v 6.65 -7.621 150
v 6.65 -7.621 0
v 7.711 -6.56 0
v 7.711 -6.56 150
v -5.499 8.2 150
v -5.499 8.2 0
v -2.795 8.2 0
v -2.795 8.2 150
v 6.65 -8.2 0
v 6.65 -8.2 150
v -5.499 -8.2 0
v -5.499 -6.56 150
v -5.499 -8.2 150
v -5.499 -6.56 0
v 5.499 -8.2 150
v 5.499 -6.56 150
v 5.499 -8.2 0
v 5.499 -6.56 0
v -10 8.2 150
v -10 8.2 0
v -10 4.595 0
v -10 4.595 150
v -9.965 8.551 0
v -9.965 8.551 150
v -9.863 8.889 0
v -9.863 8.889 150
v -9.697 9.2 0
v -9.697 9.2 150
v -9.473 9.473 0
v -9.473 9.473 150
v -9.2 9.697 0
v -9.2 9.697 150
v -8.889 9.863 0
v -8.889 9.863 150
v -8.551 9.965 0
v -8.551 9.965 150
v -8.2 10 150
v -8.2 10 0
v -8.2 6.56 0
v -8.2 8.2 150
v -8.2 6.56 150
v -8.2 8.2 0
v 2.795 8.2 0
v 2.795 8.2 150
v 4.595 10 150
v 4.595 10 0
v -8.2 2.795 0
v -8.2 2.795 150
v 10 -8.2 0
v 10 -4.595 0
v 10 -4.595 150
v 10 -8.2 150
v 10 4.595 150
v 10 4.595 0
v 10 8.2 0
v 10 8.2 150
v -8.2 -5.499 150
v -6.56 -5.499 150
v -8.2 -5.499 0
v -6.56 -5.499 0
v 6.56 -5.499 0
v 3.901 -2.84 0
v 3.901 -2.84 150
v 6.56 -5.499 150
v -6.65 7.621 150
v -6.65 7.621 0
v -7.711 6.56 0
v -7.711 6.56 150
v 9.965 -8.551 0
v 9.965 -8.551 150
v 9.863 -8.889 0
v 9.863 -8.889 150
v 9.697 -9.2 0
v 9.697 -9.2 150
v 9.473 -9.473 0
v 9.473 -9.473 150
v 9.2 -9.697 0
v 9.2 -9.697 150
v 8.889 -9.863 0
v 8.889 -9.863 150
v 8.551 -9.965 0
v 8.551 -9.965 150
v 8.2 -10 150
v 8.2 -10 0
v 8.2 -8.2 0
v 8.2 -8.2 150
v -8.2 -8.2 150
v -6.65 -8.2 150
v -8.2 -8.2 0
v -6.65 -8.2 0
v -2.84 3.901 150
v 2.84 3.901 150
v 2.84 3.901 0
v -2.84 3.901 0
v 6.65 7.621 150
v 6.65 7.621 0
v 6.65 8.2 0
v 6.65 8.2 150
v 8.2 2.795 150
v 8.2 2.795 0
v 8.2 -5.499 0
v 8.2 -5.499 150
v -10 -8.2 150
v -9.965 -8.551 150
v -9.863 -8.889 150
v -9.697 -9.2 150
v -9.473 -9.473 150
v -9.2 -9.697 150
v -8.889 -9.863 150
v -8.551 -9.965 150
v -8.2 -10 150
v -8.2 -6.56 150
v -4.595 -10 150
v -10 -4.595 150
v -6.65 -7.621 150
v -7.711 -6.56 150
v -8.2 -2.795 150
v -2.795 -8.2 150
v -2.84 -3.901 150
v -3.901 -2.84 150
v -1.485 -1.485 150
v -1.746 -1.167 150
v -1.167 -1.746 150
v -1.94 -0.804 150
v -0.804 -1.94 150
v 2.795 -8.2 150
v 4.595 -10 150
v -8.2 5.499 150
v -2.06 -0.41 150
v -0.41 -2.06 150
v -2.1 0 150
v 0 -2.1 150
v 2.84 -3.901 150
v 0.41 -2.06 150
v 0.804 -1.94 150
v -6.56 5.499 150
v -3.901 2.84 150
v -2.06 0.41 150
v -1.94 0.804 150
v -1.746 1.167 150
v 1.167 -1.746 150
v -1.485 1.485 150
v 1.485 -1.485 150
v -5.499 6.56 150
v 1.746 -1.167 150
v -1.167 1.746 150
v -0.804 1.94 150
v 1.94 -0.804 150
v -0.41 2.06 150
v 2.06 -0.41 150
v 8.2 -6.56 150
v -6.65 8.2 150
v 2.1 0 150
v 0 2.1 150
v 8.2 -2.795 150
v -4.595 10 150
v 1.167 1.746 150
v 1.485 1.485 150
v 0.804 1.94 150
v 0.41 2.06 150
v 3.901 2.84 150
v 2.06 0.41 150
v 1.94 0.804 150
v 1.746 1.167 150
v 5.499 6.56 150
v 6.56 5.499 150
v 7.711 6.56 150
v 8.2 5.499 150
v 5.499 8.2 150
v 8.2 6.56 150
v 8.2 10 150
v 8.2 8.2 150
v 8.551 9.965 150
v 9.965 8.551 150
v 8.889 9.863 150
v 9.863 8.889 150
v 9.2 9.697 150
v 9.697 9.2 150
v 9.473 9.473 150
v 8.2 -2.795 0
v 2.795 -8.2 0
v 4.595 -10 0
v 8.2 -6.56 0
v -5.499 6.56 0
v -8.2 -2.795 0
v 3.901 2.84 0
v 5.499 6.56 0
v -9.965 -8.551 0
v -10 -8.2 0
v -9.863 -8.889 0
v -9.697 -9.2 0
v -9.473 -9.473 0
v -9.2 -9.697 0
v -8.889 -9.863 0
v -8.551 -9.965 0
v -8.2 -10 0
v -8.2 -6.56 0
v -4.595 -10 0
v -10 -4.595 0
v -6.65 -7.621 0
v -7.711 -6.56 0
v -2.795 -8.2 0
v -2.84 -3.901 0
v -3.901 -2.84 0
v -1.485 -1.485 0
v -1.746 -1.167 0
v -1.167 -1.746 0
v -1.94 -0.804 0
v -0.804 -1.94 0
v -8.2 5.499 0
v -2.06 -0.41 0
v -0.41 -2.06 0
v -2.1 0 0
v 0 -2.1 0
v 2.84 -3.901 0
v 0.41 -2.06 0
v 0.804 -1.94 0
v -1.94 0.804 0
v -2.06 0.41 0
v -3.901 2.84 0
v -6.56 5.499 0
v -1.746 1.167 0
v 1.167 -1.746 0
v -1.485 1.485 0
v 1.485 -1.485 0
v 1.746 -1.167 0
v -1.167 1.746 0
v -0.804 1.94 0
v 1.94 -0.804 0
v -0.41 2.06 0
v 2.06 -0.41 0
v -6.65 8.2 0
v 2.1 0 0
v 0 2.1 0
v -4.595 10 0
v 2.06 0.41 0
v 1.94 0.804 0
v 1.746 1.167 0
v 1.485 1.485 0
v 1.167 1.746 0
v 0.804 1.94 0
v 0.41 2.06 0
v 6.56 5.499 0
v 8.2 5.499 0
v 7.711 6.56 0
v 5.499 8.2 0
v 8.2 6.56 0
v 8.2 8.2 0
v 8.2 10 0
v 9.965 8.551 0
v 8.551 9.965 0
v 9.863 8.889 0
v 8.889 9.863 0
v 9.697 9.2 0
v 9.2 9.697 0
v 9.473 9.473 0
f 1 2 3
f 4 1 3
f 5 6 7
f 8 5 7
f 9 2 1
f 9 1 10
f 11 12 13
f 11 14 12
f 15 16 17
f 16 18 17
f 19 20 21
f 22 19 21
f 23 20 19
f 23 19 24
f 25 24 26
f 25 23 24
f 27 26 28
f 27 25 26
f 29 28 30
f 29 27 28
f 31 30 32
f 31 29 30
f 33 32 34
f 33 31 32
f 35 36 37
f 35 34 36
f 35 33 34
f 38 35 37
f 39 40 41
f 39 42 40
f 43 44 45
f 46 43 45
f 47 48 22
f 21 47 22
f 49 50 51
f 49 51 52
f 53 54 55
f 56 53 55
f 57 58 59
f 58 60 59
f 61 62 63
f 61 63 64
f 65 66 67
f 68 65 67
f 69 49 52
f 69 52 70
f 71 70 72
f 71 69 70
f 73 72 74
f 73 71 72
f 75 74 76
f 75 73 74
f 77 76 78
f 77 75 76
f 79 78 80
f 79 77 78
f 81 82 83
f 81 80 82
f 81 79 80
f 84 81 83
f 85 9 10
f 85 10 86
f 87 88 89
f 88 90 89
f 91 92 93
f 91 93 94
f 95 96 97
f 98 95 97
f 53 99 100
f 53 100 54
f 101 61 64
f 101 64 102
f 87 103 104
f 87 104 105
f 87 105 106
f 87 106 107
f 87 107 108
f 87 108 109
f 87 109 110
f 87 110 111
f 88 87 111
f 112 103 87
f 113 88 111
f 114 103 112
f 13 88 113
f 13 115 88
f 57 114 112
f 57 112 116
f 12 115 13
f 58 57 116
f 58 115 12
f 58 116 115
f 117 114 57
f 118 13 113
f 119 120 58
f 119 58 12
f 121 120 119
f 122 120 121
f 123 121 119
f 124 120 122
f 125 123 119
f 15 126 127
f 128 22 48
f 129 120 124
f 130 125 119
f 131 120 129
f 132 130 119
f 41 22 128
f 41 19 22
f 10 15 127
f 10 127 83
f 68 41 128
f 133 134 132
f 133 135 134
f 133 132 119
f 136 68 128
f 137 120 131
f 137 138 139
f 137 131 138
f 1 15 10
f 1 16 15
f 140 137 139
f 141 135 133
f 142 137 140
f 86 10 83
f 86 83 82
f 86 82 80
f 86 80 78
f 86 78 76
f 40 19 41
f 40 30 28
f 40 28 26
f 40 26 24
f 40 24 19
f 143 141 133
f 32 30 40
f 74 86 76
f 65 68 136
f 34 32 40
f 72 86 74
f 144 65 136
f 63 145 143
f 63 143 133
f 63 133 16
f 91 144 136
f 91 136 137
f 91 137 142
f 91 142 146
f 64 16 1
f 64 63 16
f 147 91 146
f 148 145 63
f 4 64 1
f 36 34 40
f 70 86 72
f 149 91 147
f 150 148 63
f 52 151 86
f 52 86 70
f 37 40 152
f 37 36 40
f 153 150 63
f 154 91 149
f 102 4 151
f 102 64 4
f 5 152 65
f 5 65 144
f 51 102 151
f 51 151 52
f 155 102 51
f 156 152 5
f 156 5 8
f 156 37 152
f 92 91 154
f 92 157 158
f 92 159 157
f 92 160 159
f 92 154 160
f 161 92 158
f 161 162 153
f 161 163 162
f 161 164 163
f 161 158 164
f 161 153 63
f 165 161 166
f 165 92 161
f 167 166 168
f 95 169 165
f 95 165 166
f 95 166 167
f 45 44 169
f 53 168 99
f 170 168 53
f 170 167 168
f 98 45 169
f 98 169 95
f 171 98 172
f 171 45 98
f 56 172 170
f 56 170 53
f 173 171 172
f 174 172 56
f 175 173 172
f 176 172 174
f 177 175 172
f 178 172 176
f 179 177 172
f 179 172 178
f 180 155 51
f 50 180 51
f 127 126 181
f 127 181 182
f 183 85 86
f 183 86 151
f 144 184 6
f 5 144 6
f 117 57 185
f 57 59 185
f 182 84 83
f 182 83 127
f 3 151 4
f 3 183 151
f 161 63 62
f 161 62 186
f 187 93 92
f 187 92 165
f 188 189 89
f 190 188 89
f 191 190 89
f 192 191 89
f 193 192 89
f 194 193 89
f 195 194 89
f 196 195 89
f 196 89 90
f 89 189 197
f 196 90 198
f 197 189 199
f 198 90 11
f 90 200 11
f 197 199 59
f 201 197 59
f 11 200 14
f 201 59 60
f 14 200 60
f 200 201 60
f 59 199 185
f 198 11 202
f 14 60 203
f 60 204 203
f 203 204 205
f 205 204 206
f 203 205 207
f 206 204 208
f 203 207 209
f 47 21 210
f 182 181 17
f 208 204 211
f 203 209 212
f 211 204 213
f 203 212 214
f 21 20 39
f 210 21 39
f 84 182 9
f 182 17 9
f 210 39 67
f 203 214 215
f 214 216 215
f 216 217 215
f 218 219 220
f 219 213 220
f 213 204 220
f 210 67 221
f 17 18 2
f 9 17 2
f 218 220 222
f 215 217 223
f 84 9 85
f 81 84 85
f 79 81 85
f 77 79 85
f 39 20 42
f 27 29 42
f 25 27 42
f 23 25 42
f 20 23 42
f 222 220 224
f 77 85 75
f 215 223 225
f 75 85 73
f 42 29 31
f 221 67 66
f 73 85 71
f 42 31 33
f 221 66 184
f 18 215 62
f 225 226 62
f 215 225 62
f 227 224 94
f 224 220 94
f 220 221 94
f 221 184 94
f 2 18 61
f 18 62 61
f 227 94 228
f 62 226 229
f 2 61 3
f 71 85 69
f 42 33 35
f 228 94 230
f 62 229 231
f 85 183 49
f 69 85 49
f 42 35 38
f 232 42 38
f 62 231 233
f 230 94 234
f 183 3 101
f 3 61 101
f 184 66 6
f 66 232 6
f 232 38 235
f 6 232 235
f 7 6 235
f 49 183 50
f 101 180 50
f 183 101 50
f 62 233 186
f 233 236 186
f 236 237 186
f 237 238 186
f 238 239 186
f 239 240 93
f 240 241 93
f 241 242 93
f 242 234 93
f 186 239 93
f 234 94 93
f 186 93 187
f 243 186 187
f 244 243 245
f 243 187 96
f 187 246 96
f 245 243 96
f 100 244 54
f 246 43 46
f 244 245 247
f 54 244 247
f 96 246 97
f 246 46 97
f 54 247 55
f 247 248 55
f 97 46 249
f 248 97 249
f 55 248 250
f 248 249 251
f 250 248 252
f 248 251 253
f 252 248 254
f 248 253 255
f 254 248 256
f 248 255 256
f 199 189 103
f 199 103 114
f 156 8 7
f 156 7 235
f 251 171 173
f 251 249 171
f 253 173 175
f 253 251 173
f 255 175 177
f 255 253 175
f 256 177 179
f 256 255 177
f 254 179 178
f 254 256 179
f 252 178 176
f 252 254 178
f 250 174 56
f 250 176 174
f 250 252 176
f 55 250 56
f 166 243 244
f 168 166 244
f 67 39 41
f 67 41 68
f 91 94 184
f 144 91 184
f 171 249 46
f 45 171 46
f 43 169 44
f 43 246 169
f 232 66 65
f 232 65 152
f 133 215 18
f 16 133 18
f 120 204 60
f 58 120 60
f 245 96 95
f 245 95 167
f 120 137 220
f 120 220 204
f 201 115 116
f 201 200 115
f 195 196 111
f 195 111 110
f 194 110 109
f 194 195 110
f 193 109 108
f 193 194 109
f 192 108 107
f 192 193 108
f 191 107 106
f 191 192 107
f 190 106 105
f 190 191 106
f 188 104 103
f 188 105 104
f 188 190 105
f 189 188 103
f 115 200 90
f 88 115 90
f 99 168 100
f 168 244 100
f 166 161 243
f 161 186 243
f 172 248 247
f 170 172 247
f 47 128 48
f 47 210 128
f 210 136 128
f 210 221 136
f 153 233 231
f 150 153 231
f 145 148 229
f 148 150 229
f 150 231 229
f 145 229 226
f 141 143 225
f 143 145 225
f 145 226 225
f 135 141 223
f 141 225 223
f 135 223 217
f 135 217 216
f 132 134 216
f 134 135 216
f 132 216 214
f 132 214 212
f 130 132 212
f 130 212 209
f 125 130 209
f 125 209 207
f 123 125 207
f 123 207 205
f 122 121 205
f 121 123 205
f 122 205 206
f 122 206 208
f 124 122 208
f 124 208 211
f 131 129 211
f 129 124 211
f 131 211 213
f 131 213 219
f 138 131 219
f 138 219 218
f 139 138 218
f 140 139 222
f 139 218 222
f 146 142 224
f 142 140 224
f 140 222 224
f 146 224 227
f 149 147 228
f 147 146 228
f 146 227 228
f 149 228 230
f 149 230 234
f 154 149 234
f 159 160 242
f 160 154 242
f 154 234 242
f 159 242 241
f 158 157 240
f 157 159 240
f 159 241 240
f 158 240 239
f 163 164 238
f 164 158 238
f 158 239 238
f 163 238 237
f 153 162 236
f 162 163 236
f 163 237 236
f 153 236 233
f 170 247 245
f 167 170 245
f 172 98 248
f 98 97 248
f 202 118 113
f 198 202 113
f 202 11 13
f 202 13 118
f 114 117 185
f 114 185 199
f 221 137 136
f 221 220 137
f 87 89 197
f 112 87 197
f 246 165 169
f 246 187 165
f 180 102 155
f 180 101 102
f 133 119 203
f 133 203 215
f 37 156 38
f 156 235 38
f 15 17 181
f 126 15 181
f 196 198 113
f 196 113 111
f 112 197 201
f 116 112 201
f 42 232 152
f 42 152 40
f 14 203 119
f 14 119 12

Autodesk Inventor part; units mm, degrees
ref_plane "YZ Plane" through (0, 0, 0) normal (1, 0, 0) x (0, 1, 0)
sketch "Sketch1" plane through (0, 0, 0) normal (0, 0, 1) x (1, 0, 0)
  line L0 (10, -4.5951) -> (10, -8.2)
  line L1 (-10, -8.2) -> (-10, -4.5951)
  line L2 (-10, 10) -> (10, -10) construction
  line L3 (10, 10) -> (-10, -10) construction
  circle A0 centre (0, 0) radius 2.1
  line L4 (-2.84, -3.9007) -> (2.84, -3.9007)
  line L5 (3.9007, -2.84) -> (3.9007, 2.84)
  line L6 (2.84, 3.9007) -> (-2.84, 3.9007)
  line L7 (-3.9007, 2.84) -> (-3.9007, -2.84)
  line L8 (-3.9007, -3.9007) -> (3.9007, 3.9007) construction
  line L9 (3.9007, -3.9007) -> (-3.9007, 3.9007) construction
  line L10 (-3.9007, -2.84) -> (-2.84, -3.9007) construction
  line L11 (-2.84, -3.9007) -> (-5.4993, -6.56)
  line L12 (-5.4993, -6.56) -> (-5.4993, -8.2)
  line L13 (-5.4993, -8.2) -> (-2.7951, -8.2)
  line L14 (-2.7951, -8.2) -> (-4.5951, -10)
  line L15 (0, 0) -> (0, -3.9007) construction
  line L16 (3.9007, -2.84) -> (2.84, -3.9007) construction
  line L17 (2.84, -3.9007) -> (5.4993, -6.56)
  line L18 (5.4993, -6.56) -> (5.4993, -8.2)
  line L19 (5.4993, -8.2) -> (2.7951, -8.2)
  line L20 (2.7951, -8.2) -> (4.5951, -10)
  line L21 (-2.84, -3.9007) -> (-3.9007, -2.84) construction
  line L22 (-3.9007, -2.84) -> (-6.56, -5.4993)
  line L23 (-6.56, -5.4993) -> (-8.2, -5.4993)
  line L24 (-8.2, -5.4993) -> (-8.2, -2.7951)
  line L25 (-8.2, -2.7951) -> (-10, -4.5951)
  line L26 (3.9007, -2.84) -> (6.56, -5.4993)
  line L27 (6.56, -5.4993) -> (8.2, -5.4993)
  line L28 (8.2, -5.4993) -> (8.2, -2.7951)
  line L29 (8.2, -2.7951) -> (10, -4.5951)
  arc A1 (-10, -8.2) -> (-8.2, -10) centre (-8.2, -8.2) ccw
  arc A2 (8.2, -10) -> (10, -8.2) centre (8.2, -8.2) ccw
  line L30 (-8.2, -6.56) -> (-7.7111, -6.56)
  line L31 (-6.6505, -8.2) -> (-8.2, -8.2)
  line L32 (-8.2, -8.2) -> (-8.2, -6.56)
  line L33 (-6.6505, -7.6207) -> (-7.7111, -6.56)
  line L34 (-6.6505, -7.6207) -> (-6.6505, -8.2)
  line L35 (8.2, -6.56) -> (7.7111, -6.56)
  line L36 (6.6505, -8.2) -> (8.2, -8.2)
  line L37 (8.2, -8.2) -> (8.2, -6.56)
  line L38 (6.6505, -7.6207) -> (7.7111, -6.56)
  line L39 (6.6505, -7.6207) -> (6.6505, -8.2)
  line L40 (8.2, -10) -> (4.5951, -10)
  line L41 (-4.5951, -10) -> (-8.2, -10)
  line L42 (-3.9007, 0) -> (3.9007, 0) construction
  line L43 (10, 4.5951) -> (10, 8.2)
  line L44 (-10, 8.2) -> (-10, 4.5951)
  line L45 (-2.84, 3.9007) -> (2.84, 3.9007)
  line L46 (-3.9007, 2.84) -> (-2.84, 3.9007) construction
  line L47 (-2.84, 3.9007) -> (-5.4993, 6.56)
  line L48 (-5.4993, 6.56) -> (-5.4993, 8.2)
  line L49 (-5.4993, 8.2) -> (-2.7951, 8.2)
  line L50 (-2.7951, 8.2) -> (-4.5951, 10)
  line L51 (2.84, 3.9007) -> (5.4993, 6.56)
  line L52 (5.4993, 6.56) -> (5.4993, 8.2)
  line L53 (5.4993, 8.2) -> (2.7951, 8.2)
  line L54 (2.7951, 8.2) -> (4.5951, 10)
  line L55 (3.9007, 2.84) -> (2.84, 3.9007) construction
  line L56 (-8.2, 2.7951) -> (-10, 4.5951)
  line L57 (-2.84, 3.9007) -> (-3.9007, 2.84) construction
  line L58 (-3.9007, 2.84) -> (-6.56, 5.4993)
  line L59 (-6.56, 5.4993) -> (-8.2, 5.4993)
  line L60 (-8.2, 5.4993) -> (-8.2, 2.7951)
  line L61 (3.9007, 2.84) -> (6.56, 5.4993)
  line L62 (6.56, 5.4993) -> (8.2, 5.4993)
  line L63 (8.2, 5.4993) -> (8.2, 2.7951)
  line L64 (8.2, 2.7951) -> (10, 4.5951)
  arc A3 (-8.2, 10) -> (-10, 8.2) centre (-8.2, 8.2) ccw
  arc A4 (10, 8.2) -> (8.2, 10) centre (8.2, 8.2) ccw
  line L65 (-8.2, 6.56) -> (-7.7111, 6.56)
  line L66 (-6.6505, 8.2) -> (-8.2, 8.2)
  line L67 (-8.2, 8.2) -> (-8.2, 6.56)
  line L68 (-6.6505, 7.6207) -> (-7.7111, 6.56)
  line L69 (-6.6505, 7.6207) -> (-6.6505, 8.2)
  line L70 (8.2, 6.56) -> (7.7111, 6.56)
  line L71 (6.6505, 7.6207) -> (7.7111, 6.56)
  line L72 (8.2, 8.2) -> (8.2, 6.56)
  line L73 (6.6505, 7.6207) -> (6.6505, 8.2)
  line L74 (6.6505, 8.2) -> (8.2, 8.2)
  line L75 (8.2, 10) -> (4.5951, 10)
  line L76 (-4.5951, 10) -> (-8.2, 10)
  line L77 (-8.2, 10) -> (-4.5951, 10)
  line L78 (4.5951, 10) -> (8.2, 10)
  point P0 (8.2, -8.2)
  point P1 (0, 3.9007)
  point P2 (8.2, 8.2)
  point P3 (0, 2.1)
  point P4 (1.4849, 1.4849)
  point P5 (0, 2.1)
  point P6 (0, 10)
  dimension "Width" = 20
  dimension "Height" = 20
  dimension "d2" = 4.2
  dimension "d3" = 1.5
  dimension "d4" = 1.64
  dimension "d6" = 5.68
  dimension "d7" = 1.8
  dimension "d9" = 1.5
ref_plane "Start Plane" through (0, 0, 0) normal (0, 0, 1) x (1, 0, 0)
ref_plane "End Plane" through (0, 0, 20) normal (0, 0, 1) x (1, 0, 0)
sketch "Sketch4" plane through (0, 0, 0) normal (0, 0, 1) x (1, 0, 0)
  line L0 (0, 0) -> (10, 0)
ref_plane "Work Plane4" through (0, 0, 0) normal (0, -1, 0) x (1, 0, 0)
sketch "Sketch5" plane through (0, 0, 0) normal (0, -1, 0) x (1, 0, 0)
  line L0 (-2, 0) -> (12, 0) construction
  line L1 (-2, 20) -> (12, 20) construction
  dimension "d17" = 20
extrude "Extrusion3" add sketch "Sketch1" along normal blind 150
equation "\"G_OFFSET_START\" = 0"
equation "\"G_OFFSET_END\" = 0"
equation "\"G_L\" = d17"
properties part number "V-slot 20 mm x 20 mm" material "Aluminum 6061"
